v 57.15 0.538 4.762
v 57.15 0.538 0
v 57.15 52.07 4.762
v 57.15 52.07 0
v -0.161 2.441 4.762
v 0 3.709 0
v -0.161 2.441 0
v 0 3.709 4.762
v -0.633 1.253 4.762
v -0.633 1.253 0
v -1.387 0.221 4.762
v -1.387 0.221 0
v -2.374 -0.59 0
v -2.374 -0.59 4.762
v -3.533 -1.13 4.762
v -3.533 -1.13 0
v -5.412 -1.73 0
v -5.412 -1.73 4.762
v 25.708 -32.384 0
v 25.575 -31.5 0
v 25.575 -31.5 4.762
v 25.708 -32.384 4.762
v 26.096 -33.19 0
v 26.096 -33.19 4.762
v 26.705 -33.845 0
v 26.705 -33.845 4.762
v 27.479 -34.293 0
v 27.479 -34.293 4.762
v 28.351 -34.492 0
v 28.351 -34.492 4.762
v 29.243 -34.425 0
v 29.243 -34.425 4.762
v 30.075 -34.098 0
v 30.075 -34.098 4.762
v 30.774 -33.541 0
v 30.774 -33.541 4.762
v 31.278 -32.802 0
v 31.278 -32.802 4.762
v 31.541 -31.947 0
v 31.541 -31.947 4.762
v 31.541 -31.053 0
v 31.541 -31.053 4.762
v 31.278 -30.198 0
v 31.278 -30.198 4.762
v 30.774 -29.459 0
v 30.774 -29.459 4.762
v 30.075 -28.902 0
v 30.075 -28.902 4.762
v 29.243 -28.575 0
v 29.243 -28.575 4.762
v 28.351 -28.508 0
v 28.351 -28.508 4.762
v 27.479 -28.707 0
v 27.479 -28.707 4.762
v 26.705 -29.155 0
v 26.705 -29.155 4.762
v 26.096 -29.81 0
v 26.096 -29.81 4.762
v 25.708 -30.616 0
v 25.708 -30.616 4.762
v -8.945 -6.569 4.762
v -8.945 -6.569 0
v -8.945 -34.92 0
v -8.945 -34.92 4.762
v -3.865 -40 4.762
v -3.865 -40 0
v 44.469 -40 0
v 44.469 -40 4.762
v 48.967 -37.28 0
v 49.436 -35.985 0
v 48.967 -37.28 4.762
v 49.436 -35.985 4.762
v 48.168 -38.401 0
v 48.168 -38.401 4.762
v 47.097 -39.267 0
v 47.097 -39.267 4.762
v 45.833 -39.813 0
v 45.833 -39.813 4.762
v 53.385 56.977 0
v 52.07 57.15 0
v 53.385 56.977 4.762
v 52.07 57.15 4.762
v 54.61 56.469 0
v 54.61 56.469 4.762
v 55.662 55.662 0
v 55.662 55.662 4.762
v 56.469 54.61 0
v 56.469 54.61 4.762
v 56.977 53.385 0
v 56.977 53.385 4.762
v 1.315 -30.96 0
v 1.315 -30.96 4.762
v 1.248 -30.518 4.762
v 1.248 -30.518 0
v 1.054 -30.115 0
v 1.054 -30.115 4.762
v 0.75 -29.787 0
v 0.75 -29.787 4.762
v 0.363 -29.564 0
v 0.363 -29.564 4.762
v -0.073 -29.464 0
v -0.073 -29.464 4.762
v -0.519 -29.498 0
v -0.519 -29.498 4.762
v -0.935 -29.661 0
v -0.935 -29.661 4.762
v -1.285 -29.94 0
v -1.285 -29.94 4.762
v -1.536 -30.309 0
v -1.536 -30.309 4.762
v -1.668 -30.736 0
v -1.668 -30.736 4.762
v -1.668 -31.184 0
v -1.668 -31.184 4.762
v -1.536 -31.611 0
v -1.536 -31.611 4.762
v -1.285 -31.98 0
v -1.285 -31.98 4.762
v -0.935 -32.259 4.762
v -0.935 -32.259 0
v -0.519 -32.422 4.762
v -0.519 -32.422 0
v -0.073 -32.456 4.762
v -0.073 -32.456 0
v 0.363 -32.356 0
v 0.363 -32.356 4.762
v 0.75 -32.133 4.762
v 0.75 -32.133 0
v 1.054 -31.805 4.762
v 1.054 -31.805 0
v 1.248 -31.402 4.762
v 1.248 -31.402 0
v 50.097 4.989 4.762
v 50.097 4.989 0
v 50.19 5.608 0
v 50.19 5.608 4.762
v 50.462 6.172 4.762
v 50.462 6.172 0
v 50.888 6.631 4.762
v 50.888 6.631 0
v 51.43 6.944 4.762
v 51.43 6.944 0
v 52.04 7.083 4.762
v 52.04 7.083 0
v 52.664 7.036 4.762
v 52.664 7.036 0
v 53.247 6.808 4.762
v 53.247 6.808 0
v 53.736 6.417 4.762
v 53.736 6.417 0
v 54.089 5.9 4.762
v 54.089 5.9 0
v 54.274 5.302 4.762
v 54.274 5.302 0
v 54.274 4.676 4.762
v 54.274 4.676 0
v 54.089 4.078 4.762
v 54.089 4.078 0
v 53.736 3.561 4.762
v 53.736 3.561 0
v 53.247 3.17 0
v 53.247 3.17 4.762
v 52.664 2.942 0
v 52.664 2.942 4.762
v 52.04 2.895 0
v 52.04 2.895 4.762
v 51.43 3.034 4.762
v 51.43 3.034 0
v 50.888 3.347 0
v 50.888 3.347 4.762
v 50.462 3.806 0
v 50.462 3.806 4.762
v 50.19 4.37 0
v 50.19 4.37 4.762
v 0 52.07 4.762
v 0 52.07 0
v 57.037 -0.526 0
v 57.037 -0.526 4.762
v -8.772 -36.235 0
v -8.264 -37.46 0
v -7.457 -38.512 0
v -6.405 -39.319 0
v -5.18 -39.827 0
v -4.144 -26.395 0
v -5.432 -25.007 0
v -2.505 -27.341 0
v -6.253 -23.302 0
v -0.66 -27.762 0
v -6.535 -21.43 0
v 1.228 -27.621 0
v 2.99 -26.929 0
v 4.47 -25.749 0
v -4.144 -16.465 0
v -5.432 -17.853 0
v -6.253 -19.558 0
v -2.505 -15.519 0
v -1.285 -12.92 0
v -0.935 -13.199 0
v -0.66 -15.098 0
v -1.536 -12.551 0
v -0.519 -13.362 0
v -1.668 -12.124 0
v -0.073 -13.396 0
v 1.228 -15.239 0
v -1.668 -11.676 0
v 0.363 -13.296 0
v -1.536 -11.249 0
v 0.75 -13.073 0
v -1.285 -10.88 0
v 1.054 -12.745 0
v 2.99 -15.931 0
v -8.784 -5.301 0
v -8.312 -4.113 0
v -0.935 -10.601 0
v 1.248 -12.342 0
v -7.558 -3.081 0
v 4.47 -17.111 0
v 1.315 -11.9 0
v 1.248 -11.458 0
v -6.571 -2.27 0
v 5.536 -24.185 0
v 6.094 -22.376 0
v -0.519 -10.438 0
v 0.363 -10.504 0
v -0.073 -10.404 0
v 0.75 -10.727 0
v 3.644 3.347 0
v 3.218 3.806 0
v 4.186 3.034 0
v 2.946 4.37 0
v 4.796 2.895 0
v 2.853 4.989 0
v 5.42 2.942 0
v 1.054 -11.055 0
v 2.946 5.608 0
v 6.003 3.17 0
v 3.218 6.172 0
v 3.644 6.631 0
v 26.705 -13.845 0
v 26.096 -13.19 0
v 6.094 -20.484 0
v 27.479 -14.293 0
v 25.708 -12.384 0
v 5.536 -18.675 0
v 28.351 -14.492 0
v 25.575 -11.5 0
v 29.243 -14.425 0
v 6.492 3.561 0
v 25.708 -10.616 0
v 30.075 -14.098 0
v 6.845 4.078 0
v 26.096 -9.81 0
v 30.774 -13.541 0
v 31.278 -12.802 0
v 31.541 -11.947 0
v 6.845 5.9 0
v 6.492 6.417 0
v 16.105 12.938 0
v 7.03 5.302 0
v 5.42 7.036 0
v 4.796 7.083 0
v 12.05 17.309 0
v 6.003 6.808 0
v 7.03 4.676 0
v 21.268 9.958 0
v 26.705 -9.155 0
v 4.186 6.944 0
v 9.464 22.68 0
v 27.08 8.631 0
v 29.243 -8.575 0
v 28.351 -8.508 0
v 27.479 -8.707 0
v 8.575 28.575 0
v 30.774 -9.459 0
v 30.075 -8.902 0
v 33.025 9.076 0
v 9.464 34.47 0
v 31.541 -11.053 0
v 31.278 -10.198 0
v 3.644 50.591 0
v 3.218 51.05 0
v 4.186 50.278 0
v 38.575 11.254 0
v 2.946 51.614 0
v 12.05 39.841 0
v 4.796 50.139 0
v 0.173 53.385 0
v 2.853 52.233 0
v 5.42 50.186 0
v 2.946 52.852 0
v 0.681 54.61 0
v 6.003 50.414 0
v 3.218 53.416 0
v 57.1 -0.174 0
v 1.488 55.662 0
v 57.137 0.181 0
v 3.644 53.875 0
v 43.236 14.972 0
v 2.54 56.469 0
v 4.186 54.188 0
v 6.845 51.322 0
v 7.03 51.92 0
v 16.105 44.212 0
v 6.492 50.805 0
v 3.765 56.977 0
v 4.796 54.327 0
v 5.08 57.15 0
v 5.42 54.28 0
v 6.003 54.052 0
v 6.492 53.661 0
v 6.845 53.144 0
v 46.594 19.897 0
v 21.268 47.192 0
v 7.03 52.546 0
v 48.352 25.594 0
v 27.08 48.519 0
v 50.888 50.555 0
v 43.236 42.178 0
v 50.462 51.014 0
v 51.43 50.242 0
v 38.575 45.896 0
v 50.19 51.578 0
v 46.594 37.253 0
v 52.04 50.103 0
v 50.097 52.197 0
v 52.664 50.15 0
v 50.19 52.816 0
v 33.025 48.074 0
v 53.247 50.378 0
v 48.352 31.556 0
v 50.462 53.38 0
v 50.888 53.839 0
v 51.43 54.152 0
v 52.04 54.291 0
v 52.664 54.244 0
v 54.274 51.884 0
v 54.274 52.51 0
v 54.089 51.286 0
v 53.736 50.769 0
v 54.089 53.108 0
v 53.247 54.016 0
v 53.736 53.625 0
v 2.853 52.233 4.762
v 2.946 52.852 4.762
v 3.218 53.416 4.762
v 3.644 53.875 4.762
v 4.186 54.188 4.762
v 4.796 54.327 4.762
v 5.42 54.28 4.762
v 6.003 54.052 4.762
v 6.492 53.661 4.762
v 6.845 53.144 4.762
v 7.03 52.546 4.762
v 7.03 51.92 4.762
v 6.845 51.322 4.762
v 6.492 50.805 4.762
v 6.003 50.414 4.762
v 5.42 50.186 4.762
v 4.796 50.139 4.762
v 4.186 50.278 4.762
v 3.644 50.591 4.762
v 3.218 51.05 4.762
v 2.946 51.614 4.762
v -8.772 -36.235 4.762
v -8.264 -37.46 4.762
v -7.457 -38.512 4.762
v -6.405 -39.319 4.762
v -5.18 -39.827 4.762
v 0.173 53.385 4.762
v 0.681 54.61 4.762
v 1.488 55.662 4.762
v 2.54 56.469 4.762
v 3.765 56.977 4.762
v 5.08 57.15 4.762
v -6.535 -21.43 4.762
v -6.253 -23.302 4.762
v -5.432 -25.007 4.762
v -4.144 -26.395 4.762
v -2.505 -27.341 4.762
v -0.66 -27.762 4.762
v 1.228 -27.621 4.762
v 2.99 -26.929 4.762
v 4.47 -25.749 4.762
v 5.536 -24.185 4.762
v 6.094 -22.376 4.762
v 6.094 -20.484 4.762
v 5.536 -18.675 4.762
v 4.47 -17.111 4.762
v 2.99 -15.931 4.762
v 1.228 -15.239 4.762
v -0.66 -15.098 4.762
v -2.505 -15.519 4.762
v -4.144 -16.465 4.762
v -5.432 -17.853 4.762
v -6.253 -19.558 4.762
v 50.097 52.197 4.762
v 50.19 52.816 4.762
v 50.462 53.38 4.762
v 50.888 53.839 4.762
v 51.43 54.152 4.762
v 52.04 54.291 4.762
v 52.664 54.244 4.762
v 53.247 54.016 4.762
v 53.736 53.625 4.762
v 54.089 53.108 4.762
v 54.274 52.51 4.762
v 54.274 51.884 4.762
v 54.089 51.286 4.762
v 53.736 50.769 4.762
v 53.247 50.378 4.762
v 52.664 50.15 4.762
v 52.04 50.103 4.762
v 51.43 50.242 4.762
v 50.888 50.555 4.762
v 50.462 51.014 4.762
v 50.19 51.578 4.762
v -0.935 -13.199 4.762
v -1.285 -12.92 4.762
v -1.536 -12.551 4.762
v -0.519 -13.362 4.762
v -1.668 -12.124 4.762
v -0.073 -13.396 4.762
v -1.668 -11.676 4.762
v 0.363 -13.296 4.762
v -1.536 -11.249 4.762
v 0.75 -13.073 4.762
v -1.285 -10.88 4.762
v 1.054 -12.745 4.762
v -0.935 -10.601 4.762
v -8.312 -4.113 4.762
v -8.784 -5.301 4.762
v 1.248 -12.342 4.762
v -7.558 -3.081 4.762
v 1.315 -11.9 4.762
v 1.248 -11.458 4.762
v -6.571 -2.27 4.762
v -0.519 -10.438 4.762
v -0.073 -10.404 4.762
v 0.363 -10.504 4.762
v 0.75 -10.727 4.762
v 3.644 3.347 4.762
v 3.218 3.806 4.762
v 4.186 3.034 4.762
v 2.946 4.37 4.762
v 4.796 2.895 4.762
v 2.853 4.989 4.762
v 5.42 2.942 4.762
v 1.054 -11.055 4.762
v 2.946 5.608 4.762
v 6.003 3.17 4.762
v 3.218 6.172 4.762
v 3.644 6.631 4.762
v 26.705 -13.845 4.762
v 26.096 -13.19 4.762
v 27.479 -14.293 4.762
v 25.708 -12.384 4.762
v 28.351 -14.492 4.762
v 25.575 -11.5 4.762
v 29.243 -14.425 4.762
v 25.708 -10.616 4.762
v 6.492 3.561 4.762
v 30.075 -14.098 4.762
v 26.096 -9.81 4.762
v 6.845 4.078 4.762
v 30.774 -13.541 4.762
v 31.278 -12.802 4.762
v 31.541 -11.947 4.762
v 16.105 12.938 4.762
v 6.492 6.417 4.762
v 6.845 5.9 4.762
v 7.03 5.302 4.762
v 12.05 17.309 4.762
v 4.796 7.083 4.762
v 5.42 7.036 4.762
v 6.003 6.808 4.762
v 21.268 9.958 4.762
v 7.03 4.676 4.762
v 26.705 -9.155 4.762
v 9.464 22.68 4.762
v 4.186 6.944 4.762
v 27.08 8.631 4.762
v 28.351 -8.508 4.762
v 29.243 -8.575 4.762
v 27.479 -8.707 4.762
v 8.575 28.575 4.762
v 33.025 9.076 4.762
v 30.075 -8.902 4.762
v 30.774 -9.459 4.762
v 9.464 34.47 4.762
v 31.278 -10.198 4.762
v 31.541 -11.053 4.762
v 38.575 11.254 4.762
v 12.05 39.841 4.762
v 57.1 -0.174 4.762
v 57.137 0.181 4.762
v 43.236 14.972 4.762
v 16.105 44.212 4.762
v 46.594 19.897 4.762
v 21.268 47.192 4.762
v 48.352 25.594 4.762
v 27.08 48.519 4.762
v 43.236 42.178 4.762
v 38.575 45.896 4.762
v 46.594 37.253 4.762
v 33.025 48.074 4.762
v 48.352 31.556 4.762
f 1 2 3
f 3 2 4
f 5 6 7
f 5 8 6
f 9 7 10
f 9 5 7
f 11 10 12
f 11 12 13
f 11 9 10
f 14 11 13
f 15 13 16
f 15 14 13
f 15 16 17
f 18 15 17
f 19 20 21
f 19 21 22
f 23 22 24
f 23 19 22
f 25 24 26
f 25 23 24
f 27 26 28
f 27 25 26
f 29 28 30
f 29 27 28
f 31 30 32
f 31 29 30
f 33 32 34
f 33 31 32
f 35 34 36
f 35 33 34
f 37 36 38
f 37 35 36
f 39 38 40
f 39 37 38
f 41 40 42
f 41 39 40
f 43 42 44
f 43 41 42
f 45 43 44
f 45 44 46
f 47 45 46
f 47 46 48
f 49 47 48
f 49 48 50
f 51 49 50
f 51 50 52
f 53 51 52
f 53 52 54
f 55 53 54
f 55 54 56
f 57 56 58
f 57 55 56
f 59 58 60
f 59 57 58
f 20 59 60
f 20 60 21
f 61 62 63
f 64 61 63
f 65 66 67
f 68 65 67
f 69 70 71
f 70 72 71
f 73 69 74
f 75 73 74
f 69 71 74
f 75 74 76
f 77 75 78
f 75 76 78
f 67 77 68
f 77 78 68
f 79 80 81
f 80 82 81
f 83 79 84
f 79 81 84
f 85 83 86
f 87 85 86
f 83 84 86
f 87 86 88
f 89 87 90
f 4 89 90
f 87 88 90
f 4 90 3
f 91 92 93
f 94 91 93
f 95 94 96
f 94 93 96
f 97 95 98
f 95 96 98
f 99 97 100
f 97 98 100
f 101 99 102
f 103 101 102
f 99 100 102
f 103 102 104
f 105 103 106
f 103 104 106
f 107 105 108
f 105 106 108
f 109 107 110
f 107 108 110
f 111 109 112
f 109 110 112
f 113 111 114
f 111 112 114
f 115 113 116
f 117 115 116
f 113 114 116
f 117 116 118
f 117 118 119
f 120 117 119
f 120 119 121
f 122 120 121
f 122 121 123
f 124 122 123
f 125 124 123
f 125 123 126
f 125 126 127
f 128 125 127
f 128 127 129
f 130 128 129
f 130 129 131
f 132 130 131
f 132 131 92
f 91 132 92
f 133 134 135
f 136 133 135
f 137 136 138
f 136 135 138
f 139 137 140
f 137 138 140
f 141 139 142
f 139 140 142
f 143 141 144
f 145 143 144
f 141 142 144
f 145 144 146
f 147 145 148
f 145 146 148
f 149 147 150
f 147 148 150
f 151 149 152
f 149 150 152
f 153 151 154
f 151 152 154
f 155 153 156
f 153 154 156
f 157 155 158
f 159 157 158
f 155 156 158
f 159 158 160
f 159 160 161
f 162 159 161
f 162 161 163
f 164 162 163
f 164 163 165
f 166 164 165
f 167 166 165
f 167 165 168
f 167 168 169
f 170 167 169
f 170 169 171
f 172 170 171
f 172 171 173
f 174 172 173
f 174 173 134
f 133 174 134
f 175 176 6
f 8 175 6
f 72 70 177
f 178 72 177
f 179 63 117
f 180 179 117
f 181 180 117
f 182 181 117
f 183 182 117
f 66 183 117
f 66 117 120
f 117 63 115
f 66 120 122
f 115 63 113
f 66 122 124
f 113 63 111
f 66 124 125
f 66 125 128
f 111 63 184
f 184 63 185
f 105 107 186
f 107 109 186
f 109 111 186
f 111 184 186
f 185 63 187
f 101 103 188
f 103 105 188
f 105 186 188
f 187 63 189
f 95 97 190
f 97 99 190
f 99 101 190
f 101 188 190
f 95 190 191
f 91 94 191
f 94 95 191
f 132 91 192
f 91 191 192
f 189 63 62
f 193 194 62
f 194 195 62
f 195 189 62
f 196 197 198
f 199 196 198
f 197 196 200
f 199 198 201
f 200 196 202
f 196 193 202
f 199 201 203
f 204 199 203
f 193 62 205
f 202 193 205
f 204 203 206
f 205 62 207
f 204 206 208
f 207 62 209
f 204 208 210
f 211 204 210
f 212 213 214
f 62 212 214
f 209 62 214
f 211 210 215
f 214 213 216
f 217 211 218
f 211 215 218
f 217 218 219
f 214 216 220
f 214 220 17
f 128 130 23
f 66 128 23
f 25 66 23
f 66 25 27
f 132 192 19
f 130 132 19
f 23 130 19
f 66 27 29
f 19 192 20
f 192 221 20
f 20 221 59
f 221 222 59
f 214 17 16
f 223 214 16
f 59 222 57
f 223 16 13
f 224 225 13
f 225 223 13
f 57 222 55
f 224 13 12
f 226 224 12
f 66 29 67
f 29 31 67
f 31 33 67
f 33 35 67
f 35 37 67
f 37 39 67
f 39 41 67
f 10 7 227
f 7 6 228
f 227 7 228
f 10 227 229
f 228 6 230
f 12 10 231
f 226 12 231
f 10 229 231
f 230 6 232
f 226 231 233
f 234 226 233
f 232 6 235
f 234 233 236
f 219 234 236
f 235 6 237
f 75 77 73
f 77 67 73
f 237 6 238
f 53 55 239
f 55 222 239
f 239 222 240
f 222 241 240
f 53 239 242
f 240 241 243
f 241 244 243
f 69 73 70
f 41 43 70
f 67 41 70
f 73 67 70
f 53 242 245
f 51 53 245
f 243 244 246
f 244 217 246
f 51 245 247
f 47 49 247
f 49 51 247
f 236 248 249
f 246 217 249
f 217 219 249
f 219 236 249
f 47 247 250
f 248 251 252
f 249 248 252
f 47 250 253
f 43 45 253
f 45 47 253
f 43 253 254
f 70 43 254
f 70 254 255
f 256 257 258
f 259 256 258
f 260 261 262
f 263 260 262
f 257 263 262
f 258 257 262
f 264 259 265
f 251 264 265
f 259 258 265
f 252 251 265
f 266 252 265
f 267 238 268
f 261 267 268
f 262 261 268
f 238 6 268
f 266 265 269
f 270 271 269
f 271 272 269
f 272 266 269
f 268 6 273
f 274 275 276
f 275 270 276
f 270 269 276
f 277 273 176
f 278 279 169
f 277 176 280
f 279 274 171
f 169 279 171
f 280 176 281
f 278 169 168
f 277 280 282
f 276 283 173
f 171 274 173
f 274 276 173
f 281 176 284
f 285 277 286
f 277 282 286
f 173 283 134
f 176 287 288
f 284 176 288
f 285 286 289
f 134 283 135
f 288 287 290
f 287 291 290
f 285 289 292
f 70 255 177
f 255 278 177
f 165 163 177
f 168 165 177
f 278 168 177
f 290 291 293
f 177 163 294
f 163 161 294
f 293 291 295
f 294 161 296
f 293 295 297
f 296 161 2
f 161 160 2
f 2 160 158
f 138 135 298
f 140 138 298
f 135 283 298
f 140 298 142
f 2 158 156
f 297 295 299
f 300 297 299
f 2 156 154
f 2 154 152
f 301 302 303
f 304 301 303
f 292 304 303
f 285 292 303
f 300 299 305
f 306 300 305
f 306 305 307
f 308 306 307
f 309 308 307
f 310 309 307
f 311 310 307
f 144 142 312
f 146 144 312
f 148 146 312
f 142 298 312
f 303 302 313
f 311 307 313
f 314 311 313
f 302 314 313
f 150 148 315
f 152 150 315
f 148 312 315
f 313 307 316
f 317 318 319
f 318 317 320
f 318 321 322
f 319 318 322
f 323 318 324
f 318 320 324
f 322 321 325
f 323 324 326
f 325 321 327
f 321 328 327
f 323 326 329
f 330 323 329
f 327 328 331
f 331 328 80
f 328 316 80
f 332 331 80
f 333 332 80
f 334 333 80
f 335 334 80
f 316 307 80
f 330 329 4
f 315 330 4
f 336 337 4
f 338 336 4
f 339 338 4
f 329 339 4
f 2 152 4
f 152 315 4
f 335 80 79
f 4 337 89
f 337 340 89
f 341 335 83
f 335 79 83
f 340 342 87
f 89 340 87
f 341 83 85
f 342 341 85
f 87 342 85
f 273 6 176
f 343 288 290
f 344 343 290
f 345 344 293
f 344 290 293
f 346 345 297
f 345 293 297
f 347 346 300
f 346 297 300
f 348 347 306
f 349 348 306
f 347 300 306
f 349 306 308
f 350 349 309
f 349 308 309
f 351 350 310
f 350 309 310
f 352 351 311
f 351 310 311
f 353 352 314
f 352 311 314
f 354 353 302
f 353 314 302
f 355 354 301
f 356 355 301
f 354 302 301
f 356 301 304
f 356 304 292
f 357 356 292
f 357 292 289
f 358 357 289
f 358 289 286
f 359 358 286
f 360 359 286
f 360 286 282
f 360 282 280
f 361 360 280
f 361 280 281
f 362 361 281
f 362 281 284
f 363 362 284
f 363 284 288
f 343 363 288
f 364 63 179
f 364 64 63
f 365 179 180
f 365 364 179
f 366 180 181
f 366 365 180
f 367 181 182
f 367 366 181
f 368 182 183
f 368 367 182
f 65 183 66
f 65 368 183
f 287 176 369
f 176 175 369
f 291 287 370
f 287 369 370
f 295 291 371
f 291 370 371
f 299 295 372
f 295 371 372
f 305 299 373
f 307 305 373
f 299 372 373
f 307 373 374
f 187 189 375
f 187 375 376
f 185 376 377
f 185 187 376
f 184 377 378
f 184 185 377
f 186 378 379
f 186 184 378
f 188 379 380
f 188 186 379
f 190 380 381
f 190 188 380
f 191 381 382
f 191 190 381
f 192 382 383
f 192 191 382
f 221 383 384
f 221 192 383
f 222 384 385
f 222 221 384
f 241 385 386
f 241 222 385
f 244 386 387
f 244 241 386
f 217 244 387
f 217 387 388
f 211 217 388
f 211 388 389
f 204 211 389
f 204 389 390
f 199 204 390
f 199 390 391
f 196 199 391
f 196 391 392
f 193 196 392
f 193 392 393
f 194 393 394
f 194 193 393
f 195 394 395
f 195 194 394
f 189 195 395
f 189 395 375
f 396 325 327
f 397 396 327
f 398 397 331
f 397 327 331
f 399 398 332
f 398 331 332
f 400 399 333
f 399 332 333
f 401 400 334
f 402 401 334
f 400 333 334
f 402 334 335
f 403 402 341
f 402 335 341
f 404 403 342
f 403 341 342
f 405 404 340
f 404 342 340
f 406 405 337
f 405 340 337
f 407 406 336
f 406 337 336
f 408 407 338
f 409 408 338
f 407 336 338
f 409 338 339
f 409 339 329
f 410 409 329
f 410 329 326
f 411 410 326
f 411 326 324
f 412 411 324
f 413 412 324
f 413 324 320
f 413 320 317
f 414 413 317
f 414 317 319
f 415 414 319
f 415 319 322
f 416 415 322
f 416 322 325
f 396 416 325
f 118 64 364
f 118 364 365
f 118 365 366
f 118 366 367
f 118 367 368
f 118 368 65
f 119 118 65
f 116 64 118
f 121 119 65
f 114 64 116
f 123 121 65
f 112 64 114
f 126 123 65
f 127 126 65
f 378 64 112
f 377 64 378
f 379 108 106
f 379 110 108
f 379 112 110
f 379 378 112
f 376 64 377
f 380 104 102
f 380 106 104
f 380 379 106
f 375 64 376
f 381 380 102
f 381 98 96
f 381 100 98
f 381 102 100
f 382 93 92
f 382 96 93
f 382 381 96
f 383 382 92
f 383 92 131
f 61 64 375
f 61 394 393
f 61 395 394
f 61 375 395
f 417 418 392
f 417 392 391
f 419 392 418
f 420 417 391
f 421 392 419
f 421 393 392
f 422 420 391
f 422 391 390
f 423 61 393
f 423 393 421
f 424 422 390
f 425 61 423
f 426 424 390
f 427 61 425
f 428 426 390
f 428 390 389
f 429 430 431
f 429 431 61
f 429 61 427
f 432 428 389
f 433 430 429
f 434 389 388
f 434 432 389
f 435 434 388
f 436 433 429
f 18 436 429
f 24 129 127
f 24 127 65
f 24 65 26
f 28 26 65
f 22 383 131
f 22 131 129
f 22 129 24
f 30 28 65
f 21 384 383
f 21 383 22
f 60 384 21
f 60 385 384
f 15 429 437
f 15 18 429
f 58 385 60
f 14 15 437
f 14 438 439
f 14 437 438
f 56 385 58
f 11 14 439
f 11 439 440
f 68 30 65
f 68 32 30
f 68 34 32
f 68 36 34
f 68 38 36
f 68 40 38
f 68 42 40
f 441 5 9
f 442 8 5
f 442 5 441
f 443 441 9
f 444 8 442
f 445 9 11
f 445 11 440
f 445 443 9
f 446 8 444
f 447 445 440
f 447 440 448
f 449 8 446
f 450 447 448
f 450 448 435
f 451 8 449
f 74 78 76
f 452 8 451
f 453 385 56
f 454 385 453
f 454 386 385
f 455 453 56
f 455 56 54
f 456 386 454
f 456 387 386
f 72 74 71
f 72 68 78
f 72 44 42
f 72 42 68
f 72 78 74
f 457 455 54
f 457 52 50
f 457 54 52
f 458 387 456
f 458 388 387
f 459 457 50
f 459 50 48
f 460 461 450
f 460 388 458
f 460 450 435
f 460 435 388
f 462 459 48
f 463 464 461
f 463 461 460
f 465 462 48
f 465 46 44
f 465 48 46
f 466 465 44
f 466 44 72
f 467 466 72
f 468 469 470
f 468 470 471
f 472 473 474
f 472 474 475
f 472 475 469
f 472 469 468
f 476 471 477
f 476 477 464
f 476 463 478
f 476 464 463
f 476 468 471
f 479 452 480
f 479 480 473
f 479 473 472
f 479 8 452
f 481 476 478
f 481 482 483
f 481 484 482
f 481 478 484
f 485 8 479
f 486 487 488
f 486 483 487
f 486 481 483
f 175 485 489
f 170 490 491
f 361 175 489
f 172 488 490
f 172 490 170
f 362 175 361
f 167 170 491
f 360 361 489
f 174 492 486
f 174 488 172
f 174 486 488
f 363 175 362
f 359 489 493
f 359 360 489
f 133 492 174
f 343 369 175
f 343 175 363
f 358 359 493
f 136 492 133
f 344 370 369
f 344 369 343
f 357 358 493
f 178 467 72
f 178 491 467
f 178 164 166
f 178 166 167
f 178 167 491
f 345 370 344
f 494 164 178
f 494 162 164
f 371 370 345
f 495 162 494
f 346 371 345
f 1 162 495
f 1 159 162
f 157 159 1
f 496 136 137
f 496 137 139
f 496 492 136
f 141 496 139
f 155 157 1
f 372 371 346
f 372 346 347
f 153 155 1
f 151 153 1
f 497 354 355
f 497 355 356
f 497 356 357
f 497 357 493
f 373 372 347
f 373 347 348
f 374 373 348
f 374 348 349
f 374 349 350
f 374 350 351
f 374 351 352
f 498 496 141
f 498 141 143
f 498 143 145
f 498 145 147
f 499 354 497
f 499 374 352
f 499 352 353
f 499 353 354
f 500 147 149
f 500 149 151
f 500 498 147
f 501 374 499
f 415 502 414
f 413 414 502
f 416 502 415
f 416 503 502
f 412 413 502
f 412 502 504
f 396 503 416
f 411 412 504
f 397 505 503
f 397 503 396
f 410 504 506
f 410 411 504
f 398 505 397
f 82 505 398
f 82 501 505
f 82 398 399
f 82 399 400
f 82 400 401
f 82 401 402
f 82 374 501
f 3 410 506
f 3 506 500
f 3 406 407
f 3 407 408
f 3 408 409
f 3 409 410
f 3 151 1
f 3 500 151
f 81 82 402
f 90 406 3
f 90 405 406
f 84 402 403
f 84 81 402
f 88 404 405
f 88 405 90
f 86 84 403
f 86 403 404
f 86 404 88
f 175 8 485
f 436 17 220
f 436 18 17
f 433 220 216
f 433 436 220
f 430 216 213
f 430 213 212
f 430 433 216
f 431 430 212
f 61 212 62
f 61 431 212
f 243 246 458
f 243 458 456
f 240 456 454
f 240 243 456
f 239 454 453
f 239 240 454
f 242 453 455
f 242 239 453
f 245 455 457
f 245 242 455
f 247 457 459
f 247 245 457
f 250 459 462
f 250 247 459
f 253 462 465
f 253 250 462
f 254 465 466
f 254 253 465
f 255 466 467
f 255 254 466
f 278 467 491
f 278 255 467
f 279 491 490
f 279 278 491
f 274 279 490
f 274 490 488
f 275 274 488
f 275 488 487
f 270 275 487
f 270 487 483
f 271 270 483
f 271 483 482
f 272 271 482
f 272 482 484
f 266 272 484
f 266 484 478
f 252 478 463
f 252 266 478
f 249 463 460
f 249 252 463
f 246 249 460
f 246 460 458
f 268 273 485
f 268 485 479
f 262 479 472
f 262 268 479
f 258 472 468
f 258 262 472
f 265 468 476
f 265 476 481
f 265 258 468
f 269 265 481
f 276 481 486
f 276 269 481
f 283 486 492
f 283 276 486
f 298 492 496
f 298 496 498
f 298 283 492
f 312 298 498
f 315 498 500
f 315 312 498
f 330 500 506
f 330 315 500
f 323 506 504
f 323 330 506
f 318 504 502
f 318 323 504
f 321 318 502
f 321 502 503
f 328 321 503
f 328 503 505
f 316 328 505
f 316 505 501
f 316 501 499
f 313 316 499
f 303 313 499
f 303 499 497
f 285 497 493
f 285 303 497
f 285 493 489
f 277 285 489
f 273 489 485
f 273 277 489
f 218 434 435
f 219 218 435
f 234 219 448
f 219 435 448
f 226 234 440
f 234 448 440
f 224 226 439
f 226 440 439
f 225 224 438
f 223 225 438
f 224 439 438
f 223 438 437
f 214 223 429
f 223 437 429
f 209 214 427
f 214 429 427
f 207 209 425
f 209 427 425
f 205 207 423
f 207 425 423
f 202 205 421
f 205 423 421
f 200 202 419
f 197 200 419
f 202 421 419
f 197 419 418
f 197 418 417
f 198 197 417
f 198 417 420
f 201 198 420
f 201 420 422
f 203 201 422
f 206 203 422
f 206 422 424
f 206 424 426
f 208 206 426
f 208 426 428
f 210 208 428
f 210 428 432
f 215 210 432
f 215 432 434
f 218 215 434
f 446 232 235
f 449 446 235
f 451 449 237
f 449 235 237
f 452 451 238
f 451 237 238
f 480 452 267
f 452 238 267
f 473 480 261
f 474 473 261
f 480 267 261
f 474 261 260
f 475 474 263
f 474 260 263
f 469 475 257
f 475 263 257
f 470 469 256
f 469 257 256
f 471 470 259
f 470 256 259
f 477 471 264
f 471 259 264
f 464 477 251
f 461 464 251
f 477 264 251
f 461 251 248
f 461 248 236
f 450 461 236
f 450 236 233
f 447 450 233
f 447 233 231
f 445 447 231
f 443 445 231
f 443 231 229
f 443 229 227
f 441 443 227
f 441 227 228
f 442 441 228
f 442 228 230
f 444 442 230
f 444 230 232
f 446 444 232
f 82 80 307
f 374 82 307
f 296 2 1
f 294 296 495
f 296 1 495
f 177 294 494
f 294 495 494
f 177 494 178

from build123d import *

# Parameters (mm, degrees)
SKETCH1_R                    = 6.349999995
SKETCH1_R_2                  = 2.75
SKETCH1_R_3                  = 2.999999999
SKETCH1_R_4                  = 20
BOSS_EXTRUDE1_DEPTH          = 4.7625
FILLET1_R                    = 5.08
M5_TAPPED_HOLE1_D            = 4.2
M5_TAPPED_HOLE1_DEPTH        = 14
M5_TAPPED_HOLE1_TIP          = 1.2618073
F_3_0_3_DIAMETER_HOLE1_D     = 3
F_3_0_3_DIAMETER_HOLE1_DEPTH = 25.4
F_3_0_3_DIAMETER_HOLE1_TIP   = 0.901290929


with BuildPart() as part:
    # Sketch1 → Boss-Extrude1 (new body)
    # profile 1 of 6: a face of its own
    with BuildSketch(Plane.XY):
        Polygon((0, 57.15), (0, 0), (-8.945, -2.86), (-8.945, -40), (8.575, -40), (48.575, -40), (57.15, 0), (57.15, 57.15), align=None)
        with Locations(Location((-0.185, -21.43, 0), (0, 0, 180))):
            Circle(SKETCH1_R, mode=Mode.SUBTRACT)
        with Locations((4.953, 4.989071325)):
            Circle(SKETCH1_R_2, mode=Mode.SUBTRACT)
        with Locations(Location((28.575, -31.5, 0), (0, 0, 180))):
            Circle(SKETCH1_R_3, mode=Mode.SUBTRACT)
        with Locations(Location((28.575, -11.5, 0), (0, 0, 180))):
            Circle(SKETCH1_R_3, mode=Mode.SUBTRACT)
        with Locations((52.197, 4.989071325)):
            Circle(SKETCH1_R_2, mode=Mode.SUBTRACT)
        with Locations((4.953, 52.233071325)):
            Circle(SKETCH1_R_2, mode=Mode.SUBTRACT)
        with Locations(Location((28.575, 28.575, 0), (0, 0, 180))):
            Circle(SKETCH1_R_4, mode=Mode.SUBTRACT)
        with Locations((52.197, 52.197)):
            Circle(SKETCH1_R_2, mode=Mode.SUBTRACT)
    # profile 2 of 6: a face of its own
    with BuildSketch(Plane.XY):
        Polygon((0, 57.15), (0, 0), (-8.945, -2.86), (-8.945, -40), (8.575, -40), (48.575, -40), (57.15, 0), (57.15, 57.15), align=None)
        with Locations(Location((-0.185, -21.43, 0), (0, 0, 180))):
            Circle(SKETCH1_R, mode=Mode.SUBTRACT)
        with Locations((4.953, 4.989071325)):
            Circle(SKETCH1_R_2, mode=Mode.SUBTRACT)
        with Locations(Location((28.575, -31.5, 0), (0, 0, 180))):
            Circle(SKETCH1_R_3, mode=Mode.SUBTRACT)
        with Locations(Location((28.575, -11.5, 0), (0, 0, 180))):
            Circle(SKETCH1_R_3, mode=Mode.SUBTRACT)
        with Locations((52.197, 4.989071325)):
            Circle(SKETCH1_R_2, mode=Mode.SUBTRACT)
        with Locations((4.953, 52.233071325)):
            Circle(SKETCH1_R_2, mode=Mode.SUBTRACT)
        with Locations(Location((28.575, 28.575, 0), (0, 0, 180))):
            Circle(SKETCH1_R_4, mode=Mode.SUBTRACT)
        with Locations((52.197, 52.197)):
            Circle(SKETCH1_R_2, mode=Mode.SUBTRACT)
    # profile 3 of 6: a face of its own
    with BuildSketch(Plane.XY):
        with Locations((4.953, 52.233071325)):
            Circle(SKETCH1_R_2)
    # profile 4 of 6: a face of its own
    with BuildSketch(Plane.XY):
        with Locations((52.197, 52.197)):
            Circle(SKETCH1_R_2)
    # profile 5 of 6: a face of its own
    with BuildSketch(Plane.XY):
        with Locations((4.953, 4.989071325)):
            Circle(SKETCH1_R_2)
    # profile 6 of 6: a face of its own
    with BuildSketch(Plane.XY):
        with Locations((52.197, 4.989071325)):
            Circle(SKETCH1_R_2)
    extrude(amount=BOSS_EXTRUDE1_DEPTH)

    # Fillet1
    fillet1_edges = [part.edges().sort_by_distance(p)[0] for p in [
        (-8.945, -40, 2.38125),
        (-8.945, -2.86, 2.38125),
        (0, 0, 2.38125),
        (0, 57.15, 2.38125),
        (57.15, 57.15, 2.38125),
        (57.15, 0, 2.38125),
        (48.575, -40, 2.38125),
    ]]
    fillet(fillet1_edges, radius=FILLET1_R)

    # M5 Tapped Hole1
    with Locations(Plane.XY.offset(4.7625)):
        with Locations((4.953, 52.233071325), (52.197, 52.197), (52.197, 4.989071325), (4.953, 4.989071325)):
            Hole(M5_TAPPED_HOLE1_D / 2, depth=M5_TAPPED_HOLE1_DEPTH)
            with Locations((0, 0, -(M5_TAPPED_HOLE1_DEPTH + M5_TAPPED_HOLE1_TIP / 2))):  # 118° drill point
                Cone(0, M5_TAPPED_HOLE1_D / 2, M5_TAPPED_HOLE1_TIP, mode=Mode.SUBTRACT)

    # Ø3.0 (3) Diameter Hole1
    with Locations(Plane(origin=(0, 0, 0), x_dir=(-1, 0, 0), z_dir=(0, 0, -1))):
        with Locations((0.185, -30.96), (0.185, -11.9)):
            Hole(F_3_0_3_DIAMETER_HOLE1_D / 2, depth=F_3_0_3_DIAMETER_HOLE1_DEPTH)
            with Locations((0, 0, -(F_3_0_3_DIAMETER_HOLE1_DEPTH + F_3_0_3_DIAMETER_HOLE1_TIP / 2))):  # 118° drill point
                Cone(0, F_3_0_3_DIAMETER_HOLE1_D / 2, F_3_0_3_DIAMETER_HOLE1_TIP, mode=Mode.SUBTRACT)


solid = part.part
